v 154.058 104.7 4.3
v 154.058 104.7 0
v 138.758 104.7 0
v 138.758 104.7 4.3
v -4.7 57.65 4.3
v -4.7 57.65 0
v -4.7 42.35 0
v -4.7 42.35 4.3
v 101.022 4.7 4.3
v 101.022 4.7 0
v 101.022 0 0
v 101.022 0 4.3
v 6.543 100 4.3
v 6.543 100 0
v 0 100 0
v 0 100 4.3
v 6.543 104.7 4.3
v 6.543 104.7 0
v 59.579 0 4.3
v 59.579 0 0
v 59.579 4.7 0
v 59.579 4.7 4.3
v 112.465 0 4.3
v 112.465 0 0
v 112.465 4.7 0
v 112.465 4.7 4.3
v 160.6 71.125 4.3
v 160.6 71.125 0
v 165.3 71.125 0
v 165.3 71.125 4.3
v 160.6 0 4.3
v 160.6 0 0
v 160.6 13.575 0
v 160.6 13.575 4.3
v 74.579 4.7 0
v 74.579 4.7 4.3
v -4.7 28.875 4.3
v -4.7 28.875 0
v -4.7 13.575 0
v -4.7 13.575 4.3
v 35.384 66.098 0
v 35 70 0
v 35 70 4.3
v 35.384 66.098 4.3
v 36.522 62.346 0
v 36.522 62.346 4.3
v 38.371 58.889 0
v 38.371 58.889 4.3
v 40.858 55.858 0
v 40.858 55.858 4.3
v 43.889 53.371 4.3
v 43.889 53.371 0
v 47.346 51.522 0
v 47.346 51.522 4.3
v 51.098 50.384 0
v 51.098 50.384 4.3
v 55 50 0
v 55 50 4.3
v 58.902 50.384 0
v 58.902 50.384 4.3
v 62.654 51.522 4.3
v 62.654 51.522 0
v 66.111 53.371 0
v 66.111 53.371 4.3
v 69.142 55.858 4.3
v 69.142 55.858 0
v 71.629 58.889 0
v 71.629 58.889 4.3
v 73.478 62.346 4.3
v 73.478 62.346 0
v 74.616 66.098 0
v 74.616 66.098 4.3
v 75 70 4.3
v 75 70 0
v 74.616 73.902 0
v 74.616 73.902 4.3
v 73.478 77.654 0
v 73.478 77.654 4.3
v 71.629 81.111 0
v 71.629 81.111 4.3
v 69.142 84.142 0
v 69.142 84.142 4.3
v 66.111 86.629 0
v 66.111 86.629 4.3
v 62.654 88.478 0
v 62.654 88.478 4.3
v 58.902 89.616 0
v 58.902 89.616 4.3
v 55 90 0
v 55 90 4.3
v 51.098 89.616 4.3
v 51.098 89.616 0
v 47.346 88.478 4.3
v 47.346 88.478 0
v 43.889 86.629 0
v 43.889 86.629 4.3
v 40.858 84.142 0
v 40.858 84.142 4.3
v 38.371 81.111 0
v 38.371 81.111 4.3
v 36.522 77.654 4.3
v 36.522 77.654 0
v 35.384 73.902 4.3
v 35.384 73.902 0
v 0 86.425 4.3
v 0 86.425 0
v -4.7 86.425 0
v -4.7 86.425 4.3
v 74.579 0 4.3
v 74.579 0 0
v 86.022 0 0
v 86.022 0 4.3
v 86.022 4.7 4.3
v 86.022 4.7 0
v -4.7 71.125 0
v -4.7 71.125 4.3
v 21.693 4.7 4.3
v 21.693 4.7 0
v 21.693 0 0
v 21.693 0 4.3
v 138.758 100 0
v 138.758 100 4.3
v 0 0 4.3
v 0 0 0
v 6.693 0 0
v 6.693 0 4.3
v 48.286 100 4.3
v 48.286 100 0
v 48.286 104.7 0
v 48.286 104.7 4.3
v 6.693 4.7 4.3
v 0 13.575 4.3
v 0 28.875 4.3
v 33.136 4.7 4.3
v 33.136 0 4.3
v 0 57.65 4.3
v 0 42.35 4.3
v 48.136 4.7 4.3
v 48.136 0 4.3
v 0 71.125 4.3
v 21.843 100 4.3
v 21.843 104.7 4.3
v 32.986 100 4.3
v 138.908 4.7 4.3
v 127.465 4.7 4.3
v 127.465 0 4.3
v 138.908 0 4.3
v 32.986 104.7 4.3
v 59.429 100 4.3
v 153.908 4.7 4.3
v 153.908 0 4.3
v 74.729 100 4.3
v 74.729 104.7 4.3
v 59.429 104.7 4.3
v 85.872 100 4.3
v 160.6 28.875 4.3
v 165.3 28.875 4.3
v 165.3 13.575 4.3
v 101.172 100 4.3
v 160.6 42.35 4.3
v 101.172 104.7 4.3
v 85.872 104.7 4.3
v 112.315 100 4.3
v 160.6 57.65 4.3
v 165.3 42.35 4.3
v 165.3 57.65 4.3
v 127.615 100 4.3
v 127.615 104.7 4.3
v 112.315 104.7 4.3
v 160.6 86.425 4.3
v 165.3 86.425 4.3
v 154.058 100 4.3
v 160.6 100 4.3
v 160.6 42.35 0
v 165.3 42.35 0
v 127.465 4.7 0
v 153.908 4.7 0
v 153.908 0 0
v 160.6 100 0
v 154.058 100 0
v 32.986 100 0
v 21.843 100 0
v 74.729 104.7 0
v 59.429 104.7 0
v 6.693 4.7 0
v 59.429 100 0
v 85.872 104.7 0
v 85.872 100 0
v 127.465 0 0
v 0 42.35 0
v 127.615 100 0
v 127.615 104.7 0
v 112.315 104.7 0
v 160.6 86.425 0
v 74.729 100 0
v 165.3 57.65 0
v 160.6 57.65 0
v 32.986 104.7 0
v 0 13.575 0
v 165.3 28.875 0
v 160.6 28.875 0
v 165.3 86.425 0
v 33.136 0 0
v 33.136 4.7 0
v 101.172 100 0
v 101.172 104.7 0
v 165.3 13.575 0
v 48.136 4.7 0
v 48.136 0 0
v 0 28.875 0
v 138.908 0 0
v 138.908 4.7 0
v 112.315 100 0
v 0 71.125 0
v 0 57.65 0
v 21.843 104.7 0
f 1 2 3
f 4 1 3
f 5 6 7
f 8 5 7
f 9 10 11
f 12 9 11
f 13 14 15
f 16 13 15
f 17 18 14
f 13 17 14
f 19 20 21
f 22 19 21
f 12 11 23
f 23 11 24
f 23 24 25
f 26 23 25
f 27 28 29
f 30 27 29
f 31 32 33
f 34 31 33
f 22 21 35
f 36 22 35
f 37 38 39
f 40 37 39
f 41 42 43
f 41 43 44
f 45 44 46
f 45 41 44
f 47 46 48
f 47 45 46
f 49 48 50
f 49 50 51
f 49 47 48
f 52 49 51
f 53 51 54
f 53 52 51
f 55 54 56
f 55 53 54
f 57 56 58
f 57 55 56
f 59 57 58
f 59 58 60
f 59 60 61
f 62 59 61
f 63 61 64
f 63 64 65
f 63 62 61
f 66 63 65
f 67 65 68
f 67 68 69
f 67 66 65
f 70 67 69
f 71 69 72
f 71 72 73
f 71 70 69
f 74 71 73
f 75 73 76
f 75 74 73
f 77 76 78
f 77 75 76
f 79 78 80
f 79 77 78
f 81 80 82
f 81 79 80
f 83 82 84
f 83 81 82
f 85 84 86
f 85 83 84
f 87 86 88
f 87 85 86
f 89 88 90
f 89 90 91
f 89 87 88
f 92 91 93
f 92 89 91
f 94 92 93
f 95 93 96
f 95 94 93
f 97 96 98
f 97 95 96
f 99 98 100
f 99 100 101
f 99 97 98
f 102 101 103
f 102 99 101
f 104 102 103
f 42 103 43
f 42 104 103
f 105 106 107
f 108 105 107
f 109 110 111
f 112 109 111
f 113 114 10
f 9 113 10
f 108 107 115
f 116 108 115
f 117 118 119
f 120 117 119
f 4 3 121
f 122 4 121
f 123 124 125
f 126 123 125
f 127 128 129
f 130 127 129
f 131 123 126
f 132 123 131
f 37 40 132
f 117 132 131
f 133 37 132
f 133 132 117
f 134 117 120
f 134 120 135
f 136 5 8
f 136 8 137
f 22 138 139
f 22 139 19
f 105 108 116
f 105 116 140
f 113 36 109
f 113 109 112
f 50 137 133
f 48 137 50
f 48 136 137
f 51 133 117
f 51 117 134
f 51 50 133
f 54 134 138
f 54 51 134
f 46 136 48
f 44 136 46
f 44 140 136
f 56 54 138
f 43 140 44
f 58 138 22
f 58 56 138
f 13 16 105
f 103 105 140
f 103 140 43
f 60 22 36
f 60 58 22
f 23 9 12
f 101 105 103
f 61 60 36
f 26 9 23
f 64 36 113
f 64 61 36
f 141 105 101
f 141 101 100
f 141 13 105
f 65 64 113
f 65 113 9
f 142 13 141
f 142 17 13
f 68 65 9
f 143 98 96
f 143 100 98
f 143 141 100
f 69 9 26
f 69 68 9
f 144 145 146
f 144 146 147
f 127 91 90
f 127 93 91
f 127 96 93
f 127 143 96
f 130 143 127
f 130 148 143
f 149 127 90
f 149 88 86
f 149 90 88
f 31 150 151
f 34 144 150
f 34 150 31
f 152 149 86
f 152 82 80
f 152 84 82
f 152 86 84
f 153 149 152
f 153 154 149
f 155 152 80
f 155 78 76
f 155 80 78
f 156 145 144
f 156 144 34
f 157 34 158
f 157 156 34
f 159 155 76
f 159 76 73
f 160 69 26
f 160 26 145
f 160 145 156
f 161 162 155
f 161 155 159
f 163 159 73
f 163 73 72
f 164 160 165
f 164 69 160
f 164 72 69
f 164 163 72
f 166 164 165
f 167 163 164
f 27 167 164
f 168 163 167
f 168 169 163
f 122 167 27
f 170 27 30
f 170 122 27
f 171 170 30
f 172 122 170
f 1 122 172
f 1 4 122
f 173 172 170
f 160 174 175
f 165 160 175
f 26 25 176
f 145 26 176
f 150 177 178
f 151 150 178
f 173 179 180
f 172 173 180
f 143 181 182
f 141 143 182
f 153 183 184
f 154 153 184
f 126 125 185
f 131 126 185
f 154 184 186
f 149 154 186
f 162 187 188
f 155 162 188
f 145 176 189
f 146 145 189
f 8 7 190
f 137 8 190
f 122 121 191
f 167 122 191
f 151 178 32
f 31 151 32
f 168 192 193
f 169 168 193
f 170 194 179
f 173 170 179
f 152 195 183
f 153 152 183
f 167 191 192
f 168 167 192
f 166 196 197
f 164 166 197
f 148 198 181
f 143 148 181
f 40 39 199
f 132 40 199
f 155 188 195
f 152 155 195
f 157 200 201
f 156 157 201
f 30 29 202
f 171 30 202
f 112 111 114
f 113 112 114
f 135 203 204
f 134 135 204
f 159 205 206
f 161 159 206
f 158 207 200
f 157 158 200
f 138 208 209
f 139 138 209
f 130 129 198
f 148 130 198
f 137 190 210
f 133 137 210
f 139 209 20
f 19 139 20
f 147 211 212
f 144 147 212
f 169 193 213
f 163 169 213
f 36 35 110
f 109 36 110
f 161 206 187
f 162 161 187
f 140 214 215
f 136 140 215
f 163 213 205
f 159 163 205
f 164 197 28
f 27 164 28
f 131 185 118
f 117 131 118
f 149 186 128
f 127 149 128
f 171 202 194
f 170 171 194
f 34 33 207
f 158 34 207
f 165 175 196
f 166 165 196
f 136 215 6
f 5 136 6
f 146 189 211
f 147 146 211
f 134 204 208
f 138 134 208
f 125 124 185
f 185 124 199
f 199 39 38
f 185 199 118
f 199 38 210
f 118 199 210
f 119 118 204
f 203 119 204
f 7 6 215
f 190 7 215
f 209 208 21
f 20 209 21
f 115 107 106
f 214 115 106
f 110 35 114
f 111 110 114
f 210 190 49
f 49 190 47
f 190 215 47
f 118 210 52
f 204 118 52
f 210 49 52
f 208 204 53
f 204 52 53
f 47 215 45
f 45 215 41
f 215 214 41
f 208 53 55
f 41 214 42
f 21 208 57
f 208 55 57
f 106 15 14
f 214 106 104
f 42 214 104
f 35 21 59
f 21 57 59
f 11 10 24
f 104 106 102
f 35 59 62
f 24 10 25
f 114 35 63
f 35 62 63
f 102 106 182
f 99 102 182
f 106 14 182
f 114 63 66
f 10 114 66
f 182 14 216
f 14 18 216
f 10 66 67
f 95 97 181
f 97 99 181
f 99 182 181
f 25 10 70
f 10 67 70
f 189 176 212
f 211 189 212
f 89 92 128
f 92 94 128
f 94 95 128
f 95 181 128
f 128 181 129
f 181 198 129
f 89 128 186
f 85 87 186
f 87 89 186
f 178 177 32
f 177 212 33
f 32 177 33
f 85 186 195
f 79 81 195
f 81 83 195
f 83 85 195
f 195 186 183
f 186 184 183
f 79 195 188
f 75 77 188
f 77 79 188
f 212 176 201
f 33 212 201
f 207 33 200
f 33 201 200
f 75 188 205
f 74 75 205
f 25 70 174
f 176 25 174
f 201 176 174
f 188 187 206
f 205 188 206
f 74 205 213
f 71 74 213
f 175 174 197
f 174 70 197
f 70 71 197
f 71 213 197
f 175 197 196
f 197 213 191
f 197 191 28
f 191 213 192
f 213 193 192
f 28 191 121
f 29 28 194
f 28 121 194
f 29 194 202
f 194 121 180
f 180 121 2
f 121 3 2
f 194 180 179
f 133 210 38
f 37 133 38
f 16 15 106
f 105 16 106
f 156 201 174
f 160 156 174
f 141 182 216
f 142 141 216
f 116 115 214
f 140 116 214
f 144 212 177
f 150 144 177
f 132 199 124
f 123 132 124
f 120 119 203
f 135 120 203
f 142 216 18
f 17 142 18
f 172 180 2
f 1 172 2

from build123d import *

# Parameters (mm, degrees)
SKETCH2_R           = 20
BOSS_EXTRUDE1_DEPTH = 4.3


with BuildPart() as part:
    # Sketch2 → Boss-Extrude1 (new body)
    with BuildSketch(Plane.XY):
        Polygon((0, 0), (6.693, 0), (6.693, 4.7), (21.693, 4.7), (21.693, 0), (33.136, 0), (33.136, 4.7), (48.136, 4.7), (48.136, 0), (59.579, 0), (59.579, 4.7), (74.579, 4.7), (74.579, 0), (86.022, 0), (86.022, 4.7), (101.022, 4.7), (101.022, 0), (112.465, 0), (112.465, 4.7), (127.465, 4.7), (127.465, 0), (138.908, 0), (138.908, 4.7), (153.908, 4.7), (153.908, 0), (160.6, 0), (160.6, 13.575), (165.3, 13.575), (165.3, 28.875), (160.6, 28.875), (160.6, 42.35), (165.3, 42.35), (165.3, 57.65), (160.6, 57.65), (160.6, 71.125), (165.3, 71.125), (165.3, 86.425), (160.6, 86.425), (160.6, 100), (154.058, 100), (154.058, 104.7), (138.758, 104.7), (138.758, 100), (127.615, 100), (127.615, 104.7), (112.315, 104.7), (112.315, 100), (101.172, 100), (101.172, 104.7), (85.872, 104.7), (85.872, 100), (74.729, 100), (74.729, 104.7), (59.429, 104.7), (59.429, 100), (48.286, 100), (48.286, 104.7), (32.986, 104.7), (32.986, 100), (21.843, 100), (21.843, 104.7), (6.543, 104.7), (6.543, 100), (0, 100), (0, 86.425), (-4.7, 86.425), (-4.7, 71.125), (0, 71.125), (0, 57.65), (-4.7, 57.65), (-4.7, 42.35), (0, 42.35), (0, 28.875), (-4.7, 28.875), (-4.7, 13.575), (0, 13.575), align=None)
        with Locations(Location((55, 70, 0), (0, 0, 180))):
            Circle(SKETCH2_R, mode=Mode.SUBTRACT)
    extrude(amount=BOSS_EXTRUDE1_DEPTH)


solid = part.part
